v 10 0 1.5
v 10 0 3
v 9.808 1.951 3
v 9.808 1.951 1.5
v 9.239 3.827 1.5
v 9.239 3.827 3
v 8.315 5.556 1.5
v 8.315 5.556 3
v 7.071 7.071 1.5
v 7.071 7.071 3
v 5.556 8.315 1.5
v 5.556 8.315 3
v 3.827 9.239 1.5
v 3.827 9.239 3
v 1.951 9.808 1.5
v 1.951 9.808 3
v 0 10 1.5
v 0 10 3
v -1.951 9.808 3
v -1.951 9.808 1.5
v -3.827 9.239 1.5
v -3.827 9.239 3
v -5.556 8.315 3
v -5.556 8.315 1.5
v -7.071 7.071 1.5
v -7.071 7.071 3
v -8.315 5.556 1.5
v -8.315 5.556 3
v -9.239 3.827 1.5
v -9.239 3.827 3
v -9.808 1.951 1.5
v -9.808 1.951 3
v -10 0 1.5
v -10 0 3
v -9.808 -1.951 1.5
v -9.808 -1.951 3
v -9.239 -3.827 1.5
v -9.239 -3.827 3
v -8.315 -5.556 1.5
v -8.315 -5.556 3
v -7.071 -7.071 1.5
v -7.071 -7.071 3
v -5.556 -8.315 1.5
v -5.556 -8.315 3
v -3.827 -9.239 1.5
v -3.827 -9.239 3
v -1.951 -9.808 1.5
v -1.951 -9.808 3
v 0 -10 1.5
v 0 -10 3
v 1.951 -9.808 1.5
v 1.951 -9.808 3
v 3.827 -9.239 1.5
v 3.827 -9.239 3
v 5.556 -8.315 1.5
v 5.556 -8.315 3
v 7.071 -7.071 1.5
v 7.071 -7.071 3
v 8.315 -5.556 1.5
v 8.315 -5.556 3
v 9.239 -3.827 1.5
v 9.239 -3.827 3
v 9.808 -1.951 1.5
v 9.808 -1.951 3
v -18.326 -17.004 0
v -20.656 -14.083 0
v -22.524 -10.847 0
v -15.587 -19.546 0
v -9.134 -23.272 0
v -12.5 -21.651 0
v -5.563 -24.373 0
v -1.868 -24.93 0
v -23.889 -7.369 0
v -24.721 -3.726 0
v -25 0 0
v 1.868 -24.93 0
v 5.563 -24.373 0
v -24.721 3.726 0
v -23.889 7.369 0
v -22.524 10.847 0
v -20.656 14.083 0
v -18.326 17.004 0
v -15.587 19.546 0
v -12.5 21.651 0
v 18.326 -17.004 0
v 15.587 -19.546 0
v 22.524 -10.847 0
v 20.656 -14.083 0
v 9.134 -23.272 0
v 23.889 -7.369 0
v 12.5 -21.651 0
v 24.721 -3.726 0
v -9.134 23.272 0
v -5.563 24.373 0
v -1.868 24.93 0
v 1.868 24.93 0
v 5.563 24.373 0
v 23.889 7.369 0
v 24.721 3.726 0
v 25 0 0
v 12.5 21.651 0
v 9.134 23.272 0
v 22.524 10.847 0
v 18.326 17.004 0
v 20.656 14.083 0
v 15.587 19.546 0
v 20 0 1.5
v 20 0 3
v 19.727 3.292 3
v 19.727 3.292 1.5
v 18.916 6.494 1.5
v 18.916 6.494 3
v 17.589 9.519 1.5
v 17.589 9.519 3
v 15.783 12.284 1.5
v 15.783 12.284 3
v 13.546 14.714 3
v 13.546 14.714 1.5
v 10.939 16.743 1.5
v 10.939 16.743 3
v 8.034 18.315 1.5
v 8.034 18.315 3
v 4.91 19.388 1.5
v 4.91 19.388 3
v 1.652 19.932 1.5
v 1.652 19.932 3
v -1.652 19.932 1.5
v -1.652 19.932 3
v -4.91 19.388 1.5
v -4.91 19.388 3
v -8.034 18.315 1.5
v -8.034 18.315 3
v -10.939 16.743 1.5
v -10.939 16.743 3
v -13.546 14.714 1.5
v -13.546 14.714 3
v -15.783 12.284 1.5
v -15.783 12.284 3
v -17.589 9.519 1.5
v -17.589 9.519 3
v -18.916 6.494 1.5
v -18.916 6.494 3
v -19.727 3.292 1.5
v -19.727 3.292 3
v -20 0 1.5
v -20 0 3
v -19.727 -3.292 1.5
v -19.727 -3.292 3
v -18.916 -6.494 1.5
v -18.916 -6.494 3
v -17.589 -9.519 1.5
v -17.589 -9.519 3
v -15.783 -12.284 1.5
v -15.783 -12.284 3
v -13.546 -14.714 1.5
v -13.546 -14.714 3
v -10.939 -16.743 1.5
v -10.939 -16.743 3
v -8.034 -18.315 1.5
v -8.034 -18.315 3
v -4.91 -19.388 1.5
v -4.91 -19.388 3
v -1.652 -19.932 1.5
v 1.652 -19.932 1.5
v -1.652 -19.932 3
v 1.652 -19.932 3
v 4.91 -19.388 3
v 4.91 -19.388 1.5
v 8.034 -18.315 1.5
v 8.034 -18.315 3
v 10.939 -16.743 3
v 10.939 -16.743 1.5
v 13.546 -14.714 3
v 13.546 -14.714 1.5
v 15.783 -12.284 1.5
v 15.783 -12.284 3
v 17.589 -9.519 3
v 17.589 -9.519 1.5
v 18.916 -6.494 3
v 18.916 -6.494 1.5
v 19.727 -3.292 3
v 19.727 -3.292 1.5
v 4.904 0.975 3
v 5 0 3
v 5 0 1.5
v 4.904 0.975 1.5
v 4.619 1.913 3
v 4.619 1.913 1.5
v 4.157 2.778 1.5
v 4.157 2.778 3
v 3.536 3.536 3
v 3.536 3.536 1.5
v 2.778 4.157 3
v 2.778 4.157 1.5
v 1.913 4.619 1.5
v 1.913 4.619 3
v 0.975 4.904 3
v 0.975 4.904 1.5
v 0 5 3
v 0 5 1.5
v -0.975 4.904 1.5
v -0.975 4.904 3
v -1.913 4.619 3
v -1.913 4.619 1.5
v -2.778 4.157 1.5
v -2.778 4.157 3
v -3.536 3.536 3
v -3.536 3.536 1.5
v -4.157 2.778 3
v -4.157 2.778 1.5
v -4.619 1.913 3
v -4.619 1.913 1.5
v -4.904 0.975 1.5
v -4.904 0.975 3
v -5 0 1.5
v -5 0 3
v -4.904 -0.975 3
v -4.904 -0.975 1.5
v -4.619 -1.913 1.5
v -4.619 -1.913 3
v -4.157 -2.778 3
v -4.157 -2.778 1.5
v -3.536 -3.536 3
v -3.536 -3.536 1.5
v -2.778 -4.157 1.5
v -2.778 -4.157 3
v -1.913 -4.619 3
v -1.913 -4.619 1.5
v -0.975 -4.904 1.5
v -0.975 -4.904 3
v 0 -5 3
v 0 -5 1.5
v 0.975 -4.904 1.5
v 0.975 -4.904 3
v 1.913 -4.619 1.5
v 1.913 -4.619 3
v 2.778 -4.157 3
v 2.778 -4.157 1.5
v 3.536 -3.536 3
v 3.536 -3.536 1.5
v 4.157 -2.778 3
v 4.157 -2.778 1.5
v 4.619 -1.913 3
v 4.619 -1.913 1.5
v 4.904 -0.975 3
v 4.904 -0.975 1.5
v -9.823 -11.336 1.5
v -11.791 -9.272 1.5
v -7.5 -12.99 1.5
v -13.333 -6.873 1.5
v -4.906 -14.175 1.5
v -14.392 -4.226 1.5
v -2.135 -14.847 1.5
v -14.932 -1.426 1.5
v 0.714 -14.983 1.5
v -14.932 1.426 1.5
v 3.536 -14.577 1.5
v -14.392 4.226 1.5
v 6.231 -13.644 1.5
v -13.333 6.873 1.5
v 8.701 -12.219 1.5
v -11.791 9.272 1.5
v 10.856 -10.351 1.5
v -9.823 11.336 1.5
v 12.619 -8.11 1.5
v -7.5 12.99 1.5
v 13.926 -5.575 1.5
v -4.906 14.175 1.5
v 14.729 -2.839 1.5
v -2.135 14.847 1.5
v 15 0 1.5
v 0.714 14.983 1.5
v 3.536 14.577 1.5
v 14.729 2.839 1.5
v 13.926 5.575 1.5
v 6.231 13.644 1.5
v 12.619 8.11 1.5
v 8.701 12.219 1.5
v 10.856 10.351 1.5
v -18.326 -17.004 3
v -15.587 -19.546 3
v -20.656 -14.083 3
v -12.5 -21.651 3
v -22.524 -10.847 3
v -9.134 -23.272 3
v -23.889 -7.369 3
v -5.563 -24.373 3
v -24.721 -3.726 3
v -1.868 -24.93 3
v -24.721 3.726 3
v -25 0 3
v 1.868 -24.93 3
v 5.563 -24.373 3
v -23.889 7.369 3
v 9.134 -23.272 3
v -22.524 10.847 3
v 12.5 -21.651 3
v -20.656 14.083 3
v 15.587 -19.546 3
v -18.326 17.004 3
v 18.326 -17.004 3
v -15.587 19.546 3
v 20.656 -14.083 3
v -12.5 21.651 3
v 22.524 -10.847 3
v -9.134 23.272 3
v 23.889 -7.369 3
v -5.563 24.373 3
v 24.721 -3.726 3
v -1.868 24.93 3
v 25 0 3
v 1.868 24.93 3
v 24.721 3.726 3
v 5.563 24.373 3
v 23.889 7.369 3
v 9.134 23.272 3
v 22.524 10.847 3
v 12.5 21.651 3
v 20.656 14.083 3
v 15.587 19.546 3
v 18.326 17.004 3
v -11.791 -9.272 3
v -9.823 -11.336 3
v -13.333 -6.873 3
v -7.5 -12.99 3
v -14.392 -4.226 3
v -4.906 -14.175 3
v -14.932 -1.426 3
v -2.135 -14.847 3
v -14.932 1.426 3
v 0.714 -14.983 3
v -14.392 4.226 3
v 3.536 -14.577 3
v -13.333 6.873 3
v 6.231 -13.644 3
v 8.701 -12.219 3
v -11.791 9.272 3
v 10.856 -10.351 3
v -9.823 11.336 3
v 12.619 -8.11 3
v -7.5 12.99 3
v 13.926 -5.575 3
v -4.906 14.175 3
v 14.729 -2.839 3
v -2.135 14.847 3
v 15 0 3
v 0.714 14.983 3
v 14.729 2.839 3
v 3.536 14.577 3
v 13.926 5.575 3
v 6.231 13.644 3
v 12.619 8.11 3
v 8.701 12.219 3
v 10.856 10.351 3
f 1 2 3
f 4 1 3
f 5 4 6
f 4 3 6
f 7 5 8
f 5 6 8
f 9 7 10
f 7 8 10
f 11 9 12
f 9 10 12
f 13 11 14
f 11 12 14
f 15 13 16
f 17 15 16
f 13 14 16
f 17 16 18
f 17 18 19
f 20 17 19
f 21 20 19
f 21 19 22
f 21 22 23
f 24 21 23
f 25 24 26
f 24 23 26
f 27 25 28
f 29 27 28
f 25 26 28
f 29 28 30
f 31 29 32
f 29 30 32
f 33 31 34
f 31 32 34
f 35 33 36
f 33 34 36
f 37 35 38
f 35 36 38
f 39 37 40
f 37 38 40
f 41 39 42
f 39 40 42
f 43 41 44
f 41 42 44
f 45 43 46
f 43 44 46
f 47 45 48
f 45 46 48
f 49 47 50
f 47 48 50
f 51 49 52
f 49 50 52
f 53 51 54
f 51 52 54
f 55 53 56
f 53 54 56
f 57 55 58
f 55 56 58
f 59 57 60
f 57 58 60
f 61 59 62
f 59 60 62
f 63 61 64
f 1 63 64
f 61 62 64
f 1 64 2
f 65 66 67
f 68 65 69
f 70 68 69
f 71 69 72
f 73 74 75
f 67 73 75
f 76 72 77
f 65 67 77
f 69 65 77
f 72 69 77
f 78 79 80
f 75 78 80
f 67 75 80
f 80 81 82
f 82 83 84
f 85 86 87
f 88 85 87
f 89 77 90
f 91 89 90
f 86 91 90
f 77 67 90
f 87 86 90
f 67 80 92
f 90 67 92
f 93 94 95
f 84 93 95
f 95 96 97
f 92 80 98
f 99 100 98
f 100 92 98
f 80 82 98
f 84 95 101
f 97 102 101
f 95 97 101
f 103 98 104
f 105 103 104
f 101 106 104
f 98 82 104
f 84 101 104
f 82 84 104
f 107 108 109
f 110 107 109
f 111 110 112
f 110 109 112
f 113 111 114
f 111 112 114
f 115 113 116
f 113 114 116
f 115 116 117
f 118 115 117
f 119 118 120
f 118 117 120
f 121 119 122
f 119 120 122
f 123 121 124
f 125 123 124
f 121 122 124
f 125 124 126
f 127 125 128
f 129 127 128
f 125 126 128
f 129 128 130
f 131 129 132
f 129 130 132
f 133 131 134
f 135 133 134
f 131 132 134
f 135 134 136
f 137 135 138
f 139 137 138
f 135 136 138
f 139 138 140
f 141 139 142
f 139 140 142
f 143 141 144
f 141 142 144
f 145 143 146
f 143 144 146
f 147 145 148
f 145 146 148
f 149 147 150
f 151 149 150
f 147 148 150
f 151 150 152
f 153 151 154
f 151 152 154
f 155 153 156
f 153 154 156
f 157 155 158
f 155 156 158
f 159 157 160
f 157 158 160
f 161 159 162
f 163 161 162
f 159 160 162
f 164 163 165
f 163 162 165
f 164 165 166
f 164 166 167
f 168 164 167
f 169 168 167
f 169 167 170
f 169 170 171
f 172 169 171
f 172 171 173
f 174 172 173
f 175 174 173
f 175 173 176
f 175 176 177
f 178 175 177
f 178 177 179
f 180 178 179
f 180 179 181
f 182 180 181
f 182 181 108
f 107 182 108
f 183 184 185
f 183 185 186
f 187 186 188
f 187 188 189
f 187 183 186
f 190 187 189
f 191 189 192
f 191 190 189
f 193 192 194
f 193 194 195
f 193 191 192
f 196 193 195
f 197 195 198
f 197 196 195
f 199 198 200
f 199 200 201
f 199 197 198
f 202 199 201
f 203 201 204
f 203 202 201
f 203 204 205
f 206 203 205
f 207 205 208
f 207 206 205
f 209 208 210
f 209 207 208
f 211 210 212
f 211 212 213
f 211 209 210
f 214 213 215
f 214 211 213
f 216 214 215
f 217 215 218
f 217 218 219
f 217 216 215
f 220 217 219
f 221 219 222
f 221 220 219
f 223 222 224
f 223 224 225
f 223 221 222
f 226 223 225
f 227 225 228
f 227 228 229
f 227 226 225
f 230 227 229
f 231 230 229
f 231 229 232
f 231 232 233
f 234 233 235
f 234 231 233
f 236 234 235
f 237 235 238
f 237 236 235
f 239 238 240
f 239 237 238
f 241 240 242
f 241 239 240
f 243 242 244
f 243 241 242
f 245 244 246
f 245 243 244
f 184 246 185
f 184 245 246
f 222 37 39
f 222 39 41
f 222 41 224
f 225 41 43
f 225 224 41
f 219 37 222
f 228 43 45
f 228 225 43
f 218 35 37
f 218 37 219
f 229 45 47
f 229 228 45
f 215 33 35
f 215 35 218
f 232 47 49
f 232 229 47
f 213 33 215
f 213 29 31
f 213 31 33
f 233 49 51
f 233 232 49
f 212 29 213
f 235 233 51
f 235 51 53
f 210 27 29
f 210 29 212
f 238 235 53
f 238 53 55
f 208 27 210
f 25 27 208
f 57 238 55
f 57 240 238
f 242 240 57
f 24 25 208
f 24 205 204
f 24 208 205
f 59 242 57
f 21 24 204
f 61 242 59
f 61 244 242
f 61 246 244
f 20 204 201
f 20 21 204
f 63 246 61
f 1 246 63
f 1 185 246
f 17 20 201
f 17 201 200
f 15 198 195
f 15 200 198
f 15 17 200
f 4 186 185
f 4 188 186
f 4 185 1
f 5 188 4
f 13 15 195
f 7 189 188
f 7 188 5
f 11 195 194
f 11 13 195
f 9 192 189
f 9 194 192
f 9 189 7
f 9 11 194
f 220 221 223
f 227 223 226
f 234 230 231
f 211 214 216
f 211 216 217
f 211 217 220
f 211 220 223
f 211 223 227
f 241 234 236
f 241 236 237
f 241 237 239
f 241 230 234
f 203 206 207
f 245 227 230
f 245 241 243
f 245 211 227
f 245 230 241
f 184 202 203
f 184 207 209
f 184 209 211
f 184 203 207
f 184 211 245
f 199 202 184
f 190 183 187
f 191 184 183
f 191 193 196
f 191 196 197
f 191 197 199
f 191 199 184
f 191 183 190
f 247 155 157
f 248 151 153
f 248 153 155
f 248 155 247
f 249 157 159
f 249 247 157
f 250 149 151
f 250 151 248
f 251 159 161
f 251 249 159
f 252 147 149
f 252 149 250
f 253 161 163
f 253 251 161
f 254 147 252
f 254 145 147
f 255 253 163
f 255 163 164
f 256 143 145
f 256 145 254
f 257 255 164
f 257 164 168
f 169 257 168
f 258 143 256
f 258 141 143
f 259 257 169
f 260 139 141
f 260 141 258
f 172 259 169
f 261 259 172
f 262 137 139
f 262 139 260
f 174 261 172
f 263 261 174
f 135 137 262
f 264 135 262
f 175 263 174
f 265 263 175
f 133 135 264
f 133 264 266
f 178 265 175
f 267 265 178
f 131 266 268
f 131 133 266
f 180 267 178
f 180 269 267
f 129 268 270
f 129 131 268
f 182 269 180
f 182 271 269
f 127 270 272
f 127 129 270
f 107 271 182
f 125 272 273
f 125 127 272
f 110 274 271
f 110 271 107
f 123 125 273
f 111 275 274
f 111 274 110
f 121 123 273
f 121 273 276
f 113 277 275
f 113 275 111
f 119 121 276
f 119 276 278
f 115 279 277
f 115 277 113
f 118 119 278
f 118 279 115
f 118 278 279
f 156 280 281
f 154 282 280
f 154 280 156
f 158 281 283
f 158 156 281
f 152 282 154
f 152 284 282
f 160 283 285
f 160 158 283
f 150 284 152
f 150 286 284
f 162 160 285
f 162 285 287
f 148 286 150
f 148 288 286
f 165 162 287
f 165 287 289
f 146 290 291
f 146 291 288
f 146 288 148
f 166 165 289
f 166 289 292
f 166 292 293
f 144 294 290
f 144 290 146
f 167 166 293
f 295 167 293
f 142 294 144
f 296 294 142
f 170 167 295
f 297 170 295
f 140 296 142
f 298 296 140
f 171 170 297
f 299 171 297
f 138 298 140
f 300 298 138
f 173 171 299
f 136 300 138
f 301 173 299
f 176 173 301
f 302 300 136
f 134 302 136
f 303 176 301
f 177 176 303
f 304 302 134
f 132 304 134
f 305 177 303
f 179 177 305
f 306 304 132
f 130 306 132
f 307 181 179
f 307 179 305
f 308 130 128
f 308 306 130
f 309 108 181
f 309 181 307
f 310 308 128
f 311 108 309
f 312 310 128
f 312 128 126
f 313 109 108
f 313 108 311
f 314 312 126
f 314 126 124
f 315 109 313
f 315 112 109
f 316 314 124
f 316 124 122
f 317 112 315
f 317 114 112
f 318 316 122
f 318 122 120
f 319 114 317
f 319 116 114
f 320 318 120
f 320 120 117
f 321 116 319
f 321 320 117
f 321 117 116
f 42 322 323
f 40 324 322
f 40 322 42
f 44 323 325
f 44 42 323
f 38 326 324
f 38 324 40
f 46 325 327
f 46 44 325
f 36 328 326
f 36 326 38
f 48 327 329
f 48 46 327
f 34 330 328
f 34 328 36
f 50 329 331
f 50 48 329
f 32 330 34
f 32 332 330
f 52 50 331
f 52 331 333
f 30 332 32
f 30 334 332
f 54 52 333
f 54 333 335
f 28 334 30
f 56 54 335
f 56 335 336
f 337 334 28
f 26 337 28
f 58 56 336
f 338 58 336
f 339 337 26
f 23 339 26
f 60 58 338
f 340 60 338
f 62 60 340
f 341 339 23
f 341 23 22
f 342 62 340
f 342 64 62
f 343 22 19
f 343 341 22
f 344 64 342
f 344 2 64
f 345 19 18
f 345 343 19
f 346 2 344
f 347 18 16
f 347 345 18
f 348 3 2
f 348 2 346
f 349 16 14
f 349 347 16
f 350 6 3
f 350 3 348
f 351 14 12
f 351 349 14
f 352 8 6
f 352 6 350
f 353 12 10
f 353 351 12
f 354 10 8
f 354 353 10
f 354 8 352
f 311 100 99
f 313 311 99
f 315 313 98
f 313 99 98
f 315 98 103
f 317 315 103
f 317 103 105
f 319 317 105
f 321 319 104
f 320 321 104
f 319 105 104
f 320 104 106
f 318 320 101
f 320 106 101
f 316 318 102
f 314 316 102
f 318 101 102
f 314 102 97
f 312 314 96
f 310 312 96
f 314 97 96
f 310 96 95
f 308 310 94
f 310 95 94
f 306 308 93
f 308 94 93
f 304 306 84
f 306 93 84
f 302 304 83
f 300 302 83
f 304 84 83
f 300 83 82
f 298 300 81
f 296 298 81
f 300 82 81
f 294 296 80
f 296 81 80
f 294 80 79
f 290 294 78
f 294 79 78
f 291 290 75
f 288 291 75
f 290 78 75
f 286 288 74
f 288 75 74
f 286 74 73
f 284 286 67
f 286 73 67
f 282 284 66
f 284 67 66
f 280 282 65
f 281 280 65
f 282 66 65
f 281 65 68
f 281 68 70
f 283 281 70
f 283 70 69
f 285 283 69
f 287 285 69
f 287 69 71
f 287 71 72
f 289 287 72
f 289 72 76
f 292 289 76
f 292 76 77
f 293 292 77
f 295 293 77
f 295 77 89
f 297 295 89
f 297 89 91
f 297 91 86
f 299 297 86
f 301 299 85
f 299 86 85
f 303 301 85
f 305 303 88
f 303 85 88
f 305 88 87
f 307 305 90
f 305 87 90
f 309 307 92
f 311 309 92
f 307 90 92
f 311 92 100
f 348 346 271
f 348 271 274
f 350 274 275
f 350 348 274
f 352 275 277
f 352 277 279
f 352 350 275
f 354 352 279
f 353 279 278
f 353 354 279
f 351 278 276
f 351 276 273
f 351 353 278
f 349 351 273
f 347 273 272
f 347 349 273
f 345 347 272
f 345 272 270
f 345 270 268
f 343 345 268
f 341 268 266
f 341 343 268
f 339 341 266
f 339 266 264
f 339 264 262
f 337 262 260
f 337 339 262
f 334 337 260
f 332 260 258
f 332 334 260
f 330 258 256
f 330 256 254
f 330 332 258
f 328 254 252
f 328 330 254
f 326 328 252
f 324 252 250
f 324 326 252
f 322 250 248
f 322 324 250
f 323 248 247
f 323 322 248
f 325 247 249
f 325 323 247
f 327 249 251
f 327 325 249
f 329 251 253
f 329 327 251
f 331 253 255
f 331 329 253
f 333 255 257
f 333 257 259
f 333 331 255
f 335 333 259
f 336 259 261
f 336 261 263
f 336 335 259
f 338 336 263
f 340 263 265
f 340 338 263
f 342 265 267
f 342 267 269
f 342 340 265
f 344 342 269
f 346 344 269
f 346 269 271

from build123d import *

# Parameters (mm, degrees)
F0_R     = 25
F1_DEPTH = 3
F2_R     = 20
F2_R_2   = 15
F2_R_3   = 10
F2_R_4   = 5
F3_DEPTH = 1.5


with BuildPart() as f1:
    # F0 (on Top) → F1 (new body)
    with BuildSketch(Plane.XY):
        Circle(F0_R)
    extrude(amount=F1_DEPTH)

    # F2 (on face) → F3 (cut)
    with BuildSketch(Plane.XY.offset(3)):
        Circle(F2_R)
        Circle(F2_R_2, mode=Mode.SUBTRACT)
        Circle(F2_R_3)
        Circle(F2_R_4, mode=Mode.SUBTRACT)
    extrude(amount=-F3_DEPTH, mode=Mode.SUBTRACT)


solid = f1.part
